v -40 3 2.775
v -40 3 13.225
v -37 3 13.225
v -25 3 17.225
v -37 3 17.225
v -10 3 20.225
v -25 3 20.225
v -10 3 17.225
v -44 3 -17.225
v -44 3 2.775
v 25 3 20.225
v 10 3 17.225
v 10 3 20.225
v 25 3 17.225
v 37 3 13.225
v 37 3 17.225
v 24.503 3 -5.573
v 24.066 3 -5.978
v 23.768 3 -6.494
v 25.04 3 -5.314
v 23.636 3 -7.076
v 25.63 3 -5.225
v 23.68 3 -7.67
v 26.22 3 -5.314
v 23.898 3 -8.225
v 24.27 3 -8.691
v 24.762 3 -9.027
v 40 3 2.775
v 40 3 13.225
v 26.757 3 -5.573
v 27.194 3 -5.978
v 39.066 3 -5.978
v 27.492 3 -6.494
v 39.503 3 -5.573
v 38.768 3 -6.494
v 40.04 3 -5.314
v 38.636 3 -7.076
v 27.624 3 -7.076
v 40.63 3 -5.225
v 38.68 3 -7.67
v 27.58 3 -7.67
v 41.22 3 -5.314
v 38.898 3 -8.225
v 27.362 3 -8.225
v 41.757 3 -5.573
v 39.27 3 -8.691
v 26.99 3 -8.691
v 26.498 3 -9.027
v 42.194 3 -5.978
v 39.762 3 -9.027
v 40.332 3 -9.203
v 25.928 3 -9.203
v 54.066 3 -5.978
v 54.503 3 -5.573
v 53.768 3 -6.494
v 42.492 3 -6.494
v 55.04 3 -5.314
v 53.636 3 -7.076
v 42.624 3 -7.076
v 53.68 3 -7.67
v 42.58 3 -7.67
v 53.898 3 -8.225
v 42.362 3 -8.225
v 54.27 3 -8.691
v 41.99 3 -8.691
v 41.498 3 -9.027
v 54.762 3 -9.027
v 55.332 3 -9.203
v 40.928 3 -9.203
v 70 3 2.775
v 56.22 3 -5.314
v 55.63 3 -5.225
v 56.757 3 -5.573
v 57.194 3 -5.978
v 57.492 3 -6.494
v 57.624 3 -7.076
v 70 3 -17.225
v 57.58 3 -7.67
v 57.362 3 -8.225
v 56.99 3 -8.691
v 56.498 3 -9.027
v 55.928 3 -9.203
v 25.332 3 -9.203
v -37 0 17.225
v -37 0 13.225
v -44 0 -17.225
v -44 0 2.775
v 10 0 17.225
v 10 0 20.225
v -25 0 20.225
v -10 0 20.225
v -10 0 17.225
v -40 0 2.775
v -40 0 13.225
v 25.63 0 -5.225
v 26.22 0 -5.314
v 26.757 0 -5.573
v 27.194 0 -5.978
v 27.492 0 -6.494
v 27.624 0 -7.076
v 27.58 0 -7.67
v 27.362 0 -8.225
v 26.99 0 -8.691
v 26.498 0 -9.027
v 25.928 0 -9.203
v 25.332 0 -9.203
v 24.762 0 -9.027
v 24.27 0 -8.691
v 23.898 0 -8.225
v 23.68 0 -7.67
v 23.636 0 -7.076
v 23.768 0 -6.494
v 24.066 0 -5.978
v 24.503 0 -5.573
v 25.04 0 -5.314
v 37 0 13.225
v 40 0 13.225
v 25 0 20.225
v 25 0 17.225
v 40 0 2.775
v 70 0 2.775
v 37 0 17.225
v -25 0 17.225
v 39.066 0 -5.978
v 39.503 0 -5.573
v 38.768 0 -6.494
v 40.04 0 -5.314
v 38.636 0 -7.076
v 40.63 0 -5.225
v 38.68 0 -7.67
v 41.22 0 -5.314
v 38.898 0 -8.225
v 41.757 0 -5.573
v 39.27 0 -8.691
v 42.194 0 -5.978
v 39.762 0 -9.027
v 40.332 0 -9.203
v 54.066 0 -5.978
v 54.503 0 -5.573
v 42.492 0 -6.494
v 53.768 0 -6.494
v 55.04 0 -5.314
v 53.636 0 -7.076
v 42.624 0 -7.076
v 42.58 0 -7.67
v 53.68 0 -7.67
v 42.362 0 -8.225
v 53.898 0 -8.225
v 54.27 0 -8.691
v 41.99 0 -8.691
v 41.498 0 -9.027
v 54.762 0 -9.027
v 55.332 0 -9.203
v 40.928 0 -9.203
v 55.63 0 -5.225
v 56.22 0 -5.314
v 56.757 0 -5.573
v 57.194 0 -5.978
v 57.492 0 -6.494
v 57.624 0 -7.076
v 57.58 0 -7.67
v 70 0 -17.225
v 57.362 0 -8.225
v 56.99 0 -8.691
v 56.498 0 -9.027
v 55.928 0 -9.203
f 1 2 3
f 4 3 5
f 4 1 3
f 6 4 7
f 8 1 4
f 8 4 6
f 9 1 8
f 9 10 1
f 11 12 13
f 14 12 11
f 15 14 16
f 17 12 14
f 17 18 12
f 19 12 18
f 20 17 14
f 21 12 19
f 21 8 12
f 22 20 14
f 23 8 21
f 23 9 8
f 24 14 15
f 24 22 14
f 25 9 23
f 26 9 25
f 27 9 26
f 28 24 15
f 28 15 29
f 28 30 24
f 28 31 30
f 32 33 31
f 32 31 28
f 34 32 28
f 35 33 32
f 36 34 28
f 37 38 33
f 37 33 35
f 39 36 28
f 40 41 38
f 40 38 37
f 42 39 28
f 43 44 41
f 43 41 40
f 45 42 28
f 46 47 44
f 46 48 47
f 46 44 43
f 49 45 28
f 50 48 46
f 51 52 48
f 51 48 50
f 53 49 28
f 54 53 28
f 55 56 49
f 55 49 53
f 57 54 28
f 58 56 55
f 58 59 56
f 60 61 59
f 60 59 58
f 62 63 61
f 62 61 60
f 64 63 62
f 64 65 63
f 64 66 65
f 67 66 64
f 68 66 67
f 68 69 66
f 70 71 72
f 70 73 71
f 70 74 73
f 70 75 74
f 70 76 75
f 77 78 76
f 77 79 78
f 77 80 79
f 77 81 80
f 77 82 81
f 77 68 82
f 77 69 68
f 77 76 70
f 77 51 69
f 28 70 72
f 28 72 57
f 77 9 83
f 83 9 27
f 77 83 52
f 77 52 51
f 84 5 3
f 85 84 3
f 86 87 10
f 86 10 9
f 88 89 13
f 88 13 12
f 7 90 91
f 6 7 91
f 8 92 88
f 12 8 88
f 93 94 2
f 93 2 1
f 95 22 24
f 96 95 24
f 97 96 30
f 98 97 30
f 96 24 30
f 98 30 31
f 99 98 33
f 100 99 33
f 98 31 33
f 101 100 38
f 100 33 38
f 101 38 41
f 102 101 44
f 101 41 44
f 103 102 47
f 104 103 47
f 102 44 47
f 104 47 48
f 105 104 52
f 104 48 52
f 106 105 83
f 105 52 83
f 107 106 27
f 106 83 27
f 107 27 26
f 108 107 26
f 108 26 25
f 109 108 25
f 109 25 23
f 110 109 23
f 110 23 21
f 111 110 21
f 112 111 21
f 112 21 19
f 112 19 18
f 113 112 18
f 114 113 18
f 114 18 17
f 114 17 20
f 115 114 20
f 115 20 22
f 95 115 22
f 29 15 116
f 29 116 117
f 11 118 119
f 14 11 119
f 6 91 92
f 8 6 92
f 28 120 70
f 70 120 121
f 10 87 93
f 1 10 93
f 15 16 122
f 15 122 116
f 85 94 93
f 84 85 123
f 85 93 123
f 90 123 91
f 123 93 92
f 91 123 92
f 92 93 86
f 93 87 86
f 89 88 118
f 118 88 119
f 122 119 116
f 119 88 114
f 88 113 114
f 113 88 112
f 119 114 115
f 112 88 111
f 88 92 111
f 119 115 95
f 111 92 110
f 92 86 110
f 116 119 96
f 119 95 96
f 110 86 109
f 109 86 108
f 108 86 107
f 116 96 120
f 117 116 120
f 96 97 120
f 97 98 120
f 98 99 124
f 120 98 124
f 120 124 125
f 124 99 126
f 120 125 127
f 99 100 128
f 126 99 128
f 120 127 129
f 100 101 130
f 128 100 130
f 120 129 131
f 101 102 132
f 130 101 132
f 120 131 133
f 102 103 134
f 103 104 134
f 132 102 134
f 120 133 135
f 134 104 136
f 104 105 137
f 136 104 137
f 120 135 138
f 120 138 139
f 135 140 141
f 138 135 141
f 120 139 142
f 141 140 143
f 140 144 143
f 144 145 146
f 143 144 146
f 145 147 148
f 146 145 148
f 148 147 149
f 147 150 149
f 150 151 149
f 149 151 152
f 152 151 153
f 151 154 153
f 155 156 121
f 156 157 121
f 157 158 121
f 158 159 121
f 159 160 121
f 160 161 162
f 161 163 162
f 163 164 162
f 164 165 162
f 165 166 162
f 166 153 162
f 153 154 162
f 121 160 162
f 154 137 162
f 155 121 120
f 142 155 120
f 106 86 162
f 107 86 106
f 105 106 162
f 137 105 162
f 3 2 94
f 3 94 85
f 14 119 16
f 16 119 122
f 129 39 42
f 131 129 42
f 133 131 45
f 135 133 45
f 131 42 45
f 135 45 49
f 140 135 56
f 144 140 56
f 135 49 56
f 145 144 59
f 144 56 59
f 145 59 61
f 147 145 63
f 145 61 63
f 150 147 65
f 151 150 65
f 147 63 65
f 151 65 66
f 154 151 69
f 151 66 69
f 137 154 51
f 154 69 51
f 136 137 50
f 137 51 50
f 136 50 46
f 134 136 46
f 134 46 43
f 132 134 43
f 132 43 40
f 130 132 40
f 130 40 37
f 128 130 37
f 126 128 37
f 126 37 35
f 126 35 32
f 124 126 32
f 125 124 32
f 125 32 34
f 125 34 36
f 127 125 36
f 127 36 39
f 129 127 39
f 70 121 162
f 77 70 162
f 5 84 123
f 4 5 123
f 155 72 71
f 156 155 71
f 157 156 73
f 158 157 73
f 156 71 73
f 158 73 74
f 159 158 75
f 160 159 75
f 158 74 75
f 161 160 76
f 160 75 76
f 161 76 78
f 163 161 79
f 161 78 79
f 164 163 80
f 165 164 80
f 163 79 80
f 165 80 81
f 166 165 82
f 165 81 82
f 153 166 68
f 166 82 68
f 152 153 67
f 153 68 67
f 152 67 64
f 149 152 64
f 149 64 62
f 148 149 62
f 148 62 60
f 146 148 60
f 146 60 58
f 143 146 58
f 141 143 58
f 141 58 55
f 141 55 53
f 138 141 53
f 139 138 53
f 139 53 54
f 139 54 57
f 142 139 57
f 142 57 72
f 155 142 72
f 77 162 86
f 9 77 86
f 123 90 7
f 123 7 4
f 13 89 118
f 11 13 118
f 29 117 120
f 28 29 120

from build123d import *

# Parameters (mm, degrees)
SKETCH_1_W          = 80
SKETCH_1_H          = 34.45
SKETCH_1_W_2        = 15
SKETCH_1_H_2        = 3
SKETCH_1_W_3        = 30
SKETCH_1_H_3        = 20
SKETCH_1_W_4        = 4
EXTRUDE_1_DEPTH     = 3
SKETCH_2_R          = 2
CUT_EXTRUDE_1_DEPTH = 10
SKETCH_3_W          = 3
SKETCH_3_H          = 4
CUT_EXTRUDE_2_DEPTH = 3


with BuildPart() as part:
    # 草图1 → 凸台-拉伸1 (new body)
    with BuildSketch(Plane(origin=(0, 0, 0), x_dir=(1, 0, 0), z_dir=(0, 1, 0))):
        Rectangle(SKETCH_1_W, SKETCH_1_H)
        with Locations((-17.5, -18.725)):
            Rectangle(SKETCH_1_W_2, SKETCH_1_H_2)
        with Locations((17.5, -18.725)):
            Rectangle(SKETCH_1_W_2, SKETCH_1_H_2)
        with Locations((55, 7.225)):
            Rectangle(SKETCH_1_W_3, SKETCH_1_H_3)
        with Locations((-42, 7.225)):
            Rectangle(SKETCH_1_W_4, SKETCH_1_H_3)
    extrude(amount=EXTRUDE_1_DEPTH)

    # 草图2 → 切除-拉伸1 (cut)
    with BuildSketch(Plane(origin=(0, 3, 0), x_dir=(1, 0, 0), z_dir=(0, 1, 0))):
        with Locations(Location((55.63, 7.225, 0), (0, 0, 270))):
            Circle(SKETCH_2_R)
        with Locations(Location((40.63, 7.225, 0), (0, 0, 270))):
            Circle(SKETCH_2_R)
        with Locations(Location((25.63, 7.225, 0), (0, 0, 270))):
            Circle(SKETCH_2_R)
    extrude(amount=-CUT_EXTRUDE_1_DEPTH, mode=Mode.SUBTRACT)

    # 草图3 → 切除-拉伸2 (cut)
    with BuildSketch(Plane(origin=(0, 3, 0), x_dir=(1, 0, 0), z_dir=(0, 1, 0))):
        with Locations((-38.5, -15.225)):
            Rectangle(SKETCH_3_W, SKETCH_3_H)
        with Locations((38.5, -15.225)):
            Rectangle(SKETCH_3_W, SKETCH_3_H)
    extrude(amount=-CUT_EXTRUDE_2_DEPTH, mode=Mode.SUBTRACT)


solid = part.part
